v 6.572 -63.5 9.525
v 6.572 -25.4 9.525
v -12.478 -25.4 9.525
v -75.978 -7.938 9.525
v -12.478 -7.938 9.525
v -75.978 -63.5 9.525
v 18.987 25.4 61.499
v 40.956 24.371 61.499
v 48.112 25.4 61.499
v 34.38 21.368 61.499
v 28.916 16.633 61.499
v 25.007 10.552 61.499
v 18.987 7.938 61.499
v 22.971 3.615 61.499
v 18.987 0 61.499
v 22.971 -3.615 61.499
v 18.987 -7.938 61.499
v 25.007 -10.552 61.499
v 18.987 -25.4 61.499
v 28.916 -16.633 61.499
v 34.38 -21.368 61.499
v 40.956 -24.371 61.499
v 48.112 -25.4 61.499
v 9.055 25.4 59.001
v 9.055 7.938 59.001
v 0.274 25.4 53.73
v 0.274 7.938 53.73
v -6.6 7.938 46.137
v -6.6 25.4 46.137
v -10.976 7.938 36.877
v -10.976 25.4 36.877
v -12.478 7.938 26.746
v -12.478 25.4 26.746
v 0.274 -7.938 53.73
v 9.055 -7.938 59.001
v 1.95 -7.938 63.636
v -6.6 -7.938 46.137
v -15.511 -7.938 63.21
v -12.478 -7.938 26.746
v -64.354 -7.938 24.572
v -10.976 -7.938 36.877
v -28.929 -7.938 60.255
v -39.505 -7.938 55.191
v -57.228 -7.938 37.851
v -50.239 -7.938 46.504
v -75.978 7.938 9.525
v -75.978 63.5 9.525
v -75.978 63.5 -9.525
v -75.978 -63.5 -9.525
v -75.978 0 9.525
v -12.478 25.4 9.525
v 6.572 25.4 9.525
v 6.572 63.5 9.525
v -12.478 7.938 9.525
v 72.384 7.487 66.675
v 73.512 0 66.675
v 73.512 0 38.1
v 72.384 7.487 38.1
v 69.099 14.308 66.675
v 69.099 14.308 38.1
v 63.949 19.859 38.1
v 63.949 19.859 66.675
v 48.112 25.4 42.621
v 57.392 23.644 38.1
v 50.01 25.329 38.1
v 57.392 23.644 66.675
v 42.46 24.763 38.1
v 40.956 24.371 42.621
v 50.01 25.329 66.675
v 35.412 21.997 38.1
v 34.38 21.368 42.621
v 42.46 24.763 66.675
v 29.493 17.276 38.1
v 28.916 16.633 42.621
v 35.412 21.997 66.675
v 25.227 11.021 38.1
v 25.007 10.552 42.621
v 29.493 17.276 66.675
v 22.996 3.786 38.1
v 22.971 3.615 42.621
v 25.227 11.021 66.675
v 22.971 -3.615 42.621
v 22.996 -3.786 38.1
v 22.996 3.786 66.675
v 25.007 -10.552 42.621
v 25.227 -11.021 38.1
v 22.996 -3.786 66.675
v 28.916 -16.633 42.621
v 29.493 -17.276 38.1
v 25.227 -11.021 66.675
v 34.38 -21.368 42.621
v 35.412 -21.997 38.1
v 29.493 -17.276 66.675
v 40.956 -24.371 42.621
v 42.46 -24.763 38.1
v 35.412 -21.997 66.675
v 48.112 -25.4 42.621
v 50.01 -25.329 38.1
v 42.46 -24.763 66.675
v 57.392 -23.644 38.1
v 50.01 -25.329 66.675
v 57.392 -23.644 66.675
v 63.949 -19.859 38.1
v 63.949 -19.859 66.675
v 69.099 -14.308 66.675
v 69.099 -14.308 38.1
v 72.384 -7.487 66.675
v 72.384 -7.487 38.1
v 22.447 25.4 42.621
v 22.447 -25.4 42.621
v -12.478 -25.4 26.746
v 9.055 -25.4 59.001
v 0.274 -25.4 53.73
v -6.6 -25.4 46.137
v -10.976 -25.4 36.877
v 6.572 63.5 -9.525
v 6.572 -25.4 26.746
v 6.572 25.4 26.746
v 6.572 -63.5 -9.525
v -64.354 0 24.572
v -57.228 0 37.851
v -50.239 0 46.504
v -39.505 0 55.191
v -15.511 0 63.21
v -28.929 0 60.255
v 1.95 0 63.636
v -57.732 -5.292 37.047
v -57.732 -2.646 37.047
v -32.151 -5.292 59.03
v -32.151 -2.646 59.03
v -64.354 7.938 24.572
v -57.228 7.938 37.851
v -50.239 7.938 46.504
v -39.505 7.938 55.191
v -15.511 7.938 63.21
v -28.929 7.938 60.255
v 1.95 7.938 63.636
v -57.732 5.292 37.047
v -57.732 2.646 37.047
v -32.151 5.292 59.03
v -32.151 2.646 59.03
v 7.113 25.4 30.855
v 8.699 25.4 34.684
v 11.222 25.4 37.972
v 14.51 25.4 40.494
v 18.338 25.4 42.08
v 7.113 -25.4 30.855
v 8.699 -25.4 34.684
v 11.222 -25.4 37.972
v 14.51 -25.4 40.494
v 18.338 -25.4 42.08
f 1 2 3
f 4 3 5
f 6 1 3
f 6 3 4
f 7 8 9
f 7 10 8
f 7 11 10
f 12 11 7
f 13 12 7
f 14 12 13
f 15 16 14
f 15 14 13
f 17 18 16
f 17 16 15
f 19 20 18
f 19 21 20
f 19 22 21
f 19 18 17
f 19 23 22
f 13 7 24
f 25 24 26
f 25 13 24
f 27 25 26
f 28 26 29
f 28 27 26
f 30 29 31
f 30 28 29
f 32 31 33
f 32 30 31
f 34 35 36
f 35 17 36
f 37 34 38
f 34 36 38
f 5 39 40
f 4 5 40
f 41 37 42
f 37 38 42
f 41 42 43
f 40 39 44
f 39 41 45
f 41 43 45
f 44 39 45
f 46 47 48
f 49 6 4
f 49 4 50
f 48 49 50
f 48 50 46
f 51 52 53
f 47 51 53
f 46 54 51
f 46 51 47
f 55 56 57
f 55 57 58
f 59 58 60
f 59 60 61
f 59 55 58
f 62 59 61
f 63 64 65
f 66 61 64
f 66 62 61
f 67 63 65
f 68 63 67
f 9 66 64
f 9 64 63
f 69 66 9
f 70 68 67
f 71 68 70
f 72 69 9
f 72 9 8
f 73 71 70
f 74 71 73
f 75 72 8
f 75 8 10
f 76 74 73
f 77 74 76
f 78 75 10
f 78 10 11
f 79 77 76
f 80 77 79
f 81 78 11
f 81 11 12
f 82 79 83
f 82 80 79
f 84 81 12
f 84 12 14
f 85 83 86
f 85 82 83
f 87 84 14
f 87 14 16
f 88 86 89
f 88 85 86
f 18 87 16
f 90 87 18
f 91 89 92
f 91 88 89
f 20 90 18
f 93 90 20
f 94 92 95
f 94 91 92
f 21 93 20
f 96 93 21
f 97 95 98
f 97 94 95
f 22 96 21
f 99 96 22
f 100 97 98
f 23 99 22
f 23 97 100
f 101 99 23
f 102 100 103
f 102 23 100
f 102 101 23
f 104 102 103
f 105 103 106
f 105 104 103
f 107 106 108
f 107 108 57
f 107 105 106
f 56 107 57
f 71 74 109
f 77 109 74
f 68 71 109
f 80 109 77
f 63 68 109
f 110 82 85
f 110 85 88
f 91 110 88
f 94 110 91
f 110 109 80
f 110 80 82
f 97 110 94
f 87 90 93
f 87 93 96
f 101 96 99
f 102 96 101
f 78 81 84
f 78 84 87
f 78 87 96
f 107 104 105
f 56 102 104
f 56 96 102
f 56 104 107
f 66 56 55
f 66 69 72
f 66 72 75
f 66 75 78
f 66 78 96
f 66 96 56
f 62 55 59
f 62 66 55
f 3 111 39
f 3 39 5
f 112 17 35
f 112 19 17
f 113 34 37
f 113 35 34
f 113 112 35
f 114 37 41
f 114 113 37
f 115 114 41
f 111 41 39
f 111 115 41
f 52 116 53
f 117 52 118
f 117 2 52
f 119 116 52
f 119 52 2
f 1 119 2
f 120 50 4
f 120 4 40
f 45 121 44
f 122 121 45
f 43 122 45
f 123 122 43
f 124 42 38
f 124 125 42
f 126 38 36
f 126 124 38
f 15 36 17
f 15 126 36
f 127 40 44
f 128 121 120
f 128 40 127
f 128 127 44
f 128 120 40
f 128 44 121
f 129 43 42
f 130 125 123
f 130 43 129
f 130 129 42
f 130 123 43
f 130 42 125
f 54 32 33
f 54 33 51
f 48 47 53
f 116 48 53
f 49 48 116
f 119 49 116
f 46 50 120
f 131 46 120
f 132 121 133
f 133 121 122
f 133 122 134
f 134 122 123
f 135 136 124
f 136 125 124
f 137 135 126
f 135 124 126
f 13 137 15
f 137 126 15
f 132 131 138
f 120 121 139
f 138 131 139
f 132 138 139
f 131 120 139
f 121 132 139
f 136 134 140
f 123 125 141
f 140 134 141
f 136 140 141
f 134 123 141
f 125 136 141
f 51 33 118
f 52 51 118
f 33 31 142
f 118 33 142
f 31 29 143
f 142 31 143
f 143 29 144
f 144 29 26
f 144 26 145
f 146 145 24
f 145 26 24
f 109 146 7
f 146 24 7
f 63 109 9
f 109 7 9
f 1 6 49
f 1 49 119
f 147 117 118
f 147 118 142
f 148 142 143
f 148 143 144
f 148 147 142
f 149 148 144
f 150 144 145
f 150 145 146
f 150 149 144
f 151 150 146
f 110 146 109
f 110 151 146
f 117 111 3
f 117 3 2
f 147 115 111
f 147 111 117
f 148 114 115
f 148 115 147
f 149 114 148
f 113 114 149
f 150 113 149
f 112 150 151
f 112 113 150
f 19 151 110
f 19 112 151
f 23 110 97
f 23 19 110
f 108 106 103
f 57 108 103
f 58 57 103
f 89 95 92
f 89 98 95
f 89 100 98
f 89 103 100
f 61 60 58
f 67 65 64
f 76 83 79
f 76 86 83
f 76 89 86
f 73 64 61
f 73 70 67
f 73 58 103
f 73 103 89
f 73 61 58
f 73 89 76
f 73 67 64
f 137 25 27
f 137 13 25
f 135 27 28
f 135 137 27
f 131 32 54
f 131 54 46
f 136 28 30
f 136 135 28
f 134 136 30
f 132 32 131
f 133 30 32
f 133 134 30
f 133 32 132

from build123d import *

# Parameters (mm, degrees)
F1_DEPTH = 63.5
F2_DEPTH = 25.4
F3_DEPTH = 7.9375


with BuildPart() as f1:
    # F0 (on Front) → F1 (new body, symmetric)
    with BuildSketch(Plane.XZ):
        Polygon((-12.4777524548, 9.525), (-75.9777524548, 9.525), (-75.9777524548, -9.525), (6.5722475452, -9.525), (6.5722475452, 9.525), (-5.7358437016, 9.525), (-9.173008174, 9.525), align=None)
    extrude(amount=F1_DEPTH, both=True)

    # F0 (on Front) → F2 (join, symmetric)
    with BuildSketch(Plane.XZ):
        with BuildLine():
            Line((-12.4777524548, 26.7462), (-12.4777524548, 9.525))
            Line((-12.4777524548, 9.525), (-9.173008174, 9.525))
            Line((-9.173008174, 9.525), (-5.7358437016, 9.525))
            Line((-5.7358437016, 9.525), (6.5722475452, 9.525))
            Line((6.5722475452, 9.525), (6.5722475452, 26.7462))
            ThreePointArc((6.5722475452, 26.7462), (11.2219273939, 37.9715201513), (22.4472475452, 42.6212))
            Line((22.4472475452, 42.6212), (22.7120646, 42.6212))
            Line((22.7120646, 42.6212), (22.7120646, 61.4994115756))
            Line((22.7120646, 61.4994115756), (18.9874917473, 61.4994115756))
            ThreePointArc((18.9874917473, 61.4994115756), (-3.4427852497, 50.1868021015), (-12.4777524548, 26.7462))
        make_face()
        Polygon((48.1120646, 61.4994115756), (22.7120646, 61.4994115756), (22.7120646, 42.6212), (48.1120646, 42.6212), (48.1120646, 52.3875), align=None)
    extrude(amount=F2_DEPTH, both=True)

    # F0 (on Front) → F3 (join, symmetric)
    with BuildSketch(Plane.XZ):
        with BuildLine():
            add(Edge.make_bspline(
                [(-75.9777524548, 9.525), (-61.7776212541, 25.4792540105), (-62.3238106257, 34.5479376307), (-33.1677066113, 65.9094634104), (2.56170726, 64.6208110814), (18.9874917473, 61.4994115756)],
                knots=[0, 0, 0, 0, 0.3071399643, 0.6175559309, 1, 1, 1, 1], degree=3))
            Line((-75.9777524548, 9.525), (-12.4777524548, 9.525))
            Line((-12.4777524548, 9.525), (-12.4777524548, 26.7462))
            ThreePointArc((-12.4777524548, 26.7462), (-3.4427852497, 50.1868021015), (18.9874917473, 61.4994115756))
        make_face()
    extrude(amount=F3_DEPTH, both=True)

    # F0 (on Front) → F4 (revolve)
    with BuildSketch(Plane.XZ):
        Polygon((48.1120646, 66.675), (48.1120646, 61.4994115756), (48.1120646, 52.3875), (48.1120646, 42.6212), (48.1120646, 38.1), (73.5120646, 38.1), (73.5120646, 66.675), align=None)
    revolve(axis=Axis((48.1120646, 0, 59.53125), (0, 0, 1)))


solid = f1.part
